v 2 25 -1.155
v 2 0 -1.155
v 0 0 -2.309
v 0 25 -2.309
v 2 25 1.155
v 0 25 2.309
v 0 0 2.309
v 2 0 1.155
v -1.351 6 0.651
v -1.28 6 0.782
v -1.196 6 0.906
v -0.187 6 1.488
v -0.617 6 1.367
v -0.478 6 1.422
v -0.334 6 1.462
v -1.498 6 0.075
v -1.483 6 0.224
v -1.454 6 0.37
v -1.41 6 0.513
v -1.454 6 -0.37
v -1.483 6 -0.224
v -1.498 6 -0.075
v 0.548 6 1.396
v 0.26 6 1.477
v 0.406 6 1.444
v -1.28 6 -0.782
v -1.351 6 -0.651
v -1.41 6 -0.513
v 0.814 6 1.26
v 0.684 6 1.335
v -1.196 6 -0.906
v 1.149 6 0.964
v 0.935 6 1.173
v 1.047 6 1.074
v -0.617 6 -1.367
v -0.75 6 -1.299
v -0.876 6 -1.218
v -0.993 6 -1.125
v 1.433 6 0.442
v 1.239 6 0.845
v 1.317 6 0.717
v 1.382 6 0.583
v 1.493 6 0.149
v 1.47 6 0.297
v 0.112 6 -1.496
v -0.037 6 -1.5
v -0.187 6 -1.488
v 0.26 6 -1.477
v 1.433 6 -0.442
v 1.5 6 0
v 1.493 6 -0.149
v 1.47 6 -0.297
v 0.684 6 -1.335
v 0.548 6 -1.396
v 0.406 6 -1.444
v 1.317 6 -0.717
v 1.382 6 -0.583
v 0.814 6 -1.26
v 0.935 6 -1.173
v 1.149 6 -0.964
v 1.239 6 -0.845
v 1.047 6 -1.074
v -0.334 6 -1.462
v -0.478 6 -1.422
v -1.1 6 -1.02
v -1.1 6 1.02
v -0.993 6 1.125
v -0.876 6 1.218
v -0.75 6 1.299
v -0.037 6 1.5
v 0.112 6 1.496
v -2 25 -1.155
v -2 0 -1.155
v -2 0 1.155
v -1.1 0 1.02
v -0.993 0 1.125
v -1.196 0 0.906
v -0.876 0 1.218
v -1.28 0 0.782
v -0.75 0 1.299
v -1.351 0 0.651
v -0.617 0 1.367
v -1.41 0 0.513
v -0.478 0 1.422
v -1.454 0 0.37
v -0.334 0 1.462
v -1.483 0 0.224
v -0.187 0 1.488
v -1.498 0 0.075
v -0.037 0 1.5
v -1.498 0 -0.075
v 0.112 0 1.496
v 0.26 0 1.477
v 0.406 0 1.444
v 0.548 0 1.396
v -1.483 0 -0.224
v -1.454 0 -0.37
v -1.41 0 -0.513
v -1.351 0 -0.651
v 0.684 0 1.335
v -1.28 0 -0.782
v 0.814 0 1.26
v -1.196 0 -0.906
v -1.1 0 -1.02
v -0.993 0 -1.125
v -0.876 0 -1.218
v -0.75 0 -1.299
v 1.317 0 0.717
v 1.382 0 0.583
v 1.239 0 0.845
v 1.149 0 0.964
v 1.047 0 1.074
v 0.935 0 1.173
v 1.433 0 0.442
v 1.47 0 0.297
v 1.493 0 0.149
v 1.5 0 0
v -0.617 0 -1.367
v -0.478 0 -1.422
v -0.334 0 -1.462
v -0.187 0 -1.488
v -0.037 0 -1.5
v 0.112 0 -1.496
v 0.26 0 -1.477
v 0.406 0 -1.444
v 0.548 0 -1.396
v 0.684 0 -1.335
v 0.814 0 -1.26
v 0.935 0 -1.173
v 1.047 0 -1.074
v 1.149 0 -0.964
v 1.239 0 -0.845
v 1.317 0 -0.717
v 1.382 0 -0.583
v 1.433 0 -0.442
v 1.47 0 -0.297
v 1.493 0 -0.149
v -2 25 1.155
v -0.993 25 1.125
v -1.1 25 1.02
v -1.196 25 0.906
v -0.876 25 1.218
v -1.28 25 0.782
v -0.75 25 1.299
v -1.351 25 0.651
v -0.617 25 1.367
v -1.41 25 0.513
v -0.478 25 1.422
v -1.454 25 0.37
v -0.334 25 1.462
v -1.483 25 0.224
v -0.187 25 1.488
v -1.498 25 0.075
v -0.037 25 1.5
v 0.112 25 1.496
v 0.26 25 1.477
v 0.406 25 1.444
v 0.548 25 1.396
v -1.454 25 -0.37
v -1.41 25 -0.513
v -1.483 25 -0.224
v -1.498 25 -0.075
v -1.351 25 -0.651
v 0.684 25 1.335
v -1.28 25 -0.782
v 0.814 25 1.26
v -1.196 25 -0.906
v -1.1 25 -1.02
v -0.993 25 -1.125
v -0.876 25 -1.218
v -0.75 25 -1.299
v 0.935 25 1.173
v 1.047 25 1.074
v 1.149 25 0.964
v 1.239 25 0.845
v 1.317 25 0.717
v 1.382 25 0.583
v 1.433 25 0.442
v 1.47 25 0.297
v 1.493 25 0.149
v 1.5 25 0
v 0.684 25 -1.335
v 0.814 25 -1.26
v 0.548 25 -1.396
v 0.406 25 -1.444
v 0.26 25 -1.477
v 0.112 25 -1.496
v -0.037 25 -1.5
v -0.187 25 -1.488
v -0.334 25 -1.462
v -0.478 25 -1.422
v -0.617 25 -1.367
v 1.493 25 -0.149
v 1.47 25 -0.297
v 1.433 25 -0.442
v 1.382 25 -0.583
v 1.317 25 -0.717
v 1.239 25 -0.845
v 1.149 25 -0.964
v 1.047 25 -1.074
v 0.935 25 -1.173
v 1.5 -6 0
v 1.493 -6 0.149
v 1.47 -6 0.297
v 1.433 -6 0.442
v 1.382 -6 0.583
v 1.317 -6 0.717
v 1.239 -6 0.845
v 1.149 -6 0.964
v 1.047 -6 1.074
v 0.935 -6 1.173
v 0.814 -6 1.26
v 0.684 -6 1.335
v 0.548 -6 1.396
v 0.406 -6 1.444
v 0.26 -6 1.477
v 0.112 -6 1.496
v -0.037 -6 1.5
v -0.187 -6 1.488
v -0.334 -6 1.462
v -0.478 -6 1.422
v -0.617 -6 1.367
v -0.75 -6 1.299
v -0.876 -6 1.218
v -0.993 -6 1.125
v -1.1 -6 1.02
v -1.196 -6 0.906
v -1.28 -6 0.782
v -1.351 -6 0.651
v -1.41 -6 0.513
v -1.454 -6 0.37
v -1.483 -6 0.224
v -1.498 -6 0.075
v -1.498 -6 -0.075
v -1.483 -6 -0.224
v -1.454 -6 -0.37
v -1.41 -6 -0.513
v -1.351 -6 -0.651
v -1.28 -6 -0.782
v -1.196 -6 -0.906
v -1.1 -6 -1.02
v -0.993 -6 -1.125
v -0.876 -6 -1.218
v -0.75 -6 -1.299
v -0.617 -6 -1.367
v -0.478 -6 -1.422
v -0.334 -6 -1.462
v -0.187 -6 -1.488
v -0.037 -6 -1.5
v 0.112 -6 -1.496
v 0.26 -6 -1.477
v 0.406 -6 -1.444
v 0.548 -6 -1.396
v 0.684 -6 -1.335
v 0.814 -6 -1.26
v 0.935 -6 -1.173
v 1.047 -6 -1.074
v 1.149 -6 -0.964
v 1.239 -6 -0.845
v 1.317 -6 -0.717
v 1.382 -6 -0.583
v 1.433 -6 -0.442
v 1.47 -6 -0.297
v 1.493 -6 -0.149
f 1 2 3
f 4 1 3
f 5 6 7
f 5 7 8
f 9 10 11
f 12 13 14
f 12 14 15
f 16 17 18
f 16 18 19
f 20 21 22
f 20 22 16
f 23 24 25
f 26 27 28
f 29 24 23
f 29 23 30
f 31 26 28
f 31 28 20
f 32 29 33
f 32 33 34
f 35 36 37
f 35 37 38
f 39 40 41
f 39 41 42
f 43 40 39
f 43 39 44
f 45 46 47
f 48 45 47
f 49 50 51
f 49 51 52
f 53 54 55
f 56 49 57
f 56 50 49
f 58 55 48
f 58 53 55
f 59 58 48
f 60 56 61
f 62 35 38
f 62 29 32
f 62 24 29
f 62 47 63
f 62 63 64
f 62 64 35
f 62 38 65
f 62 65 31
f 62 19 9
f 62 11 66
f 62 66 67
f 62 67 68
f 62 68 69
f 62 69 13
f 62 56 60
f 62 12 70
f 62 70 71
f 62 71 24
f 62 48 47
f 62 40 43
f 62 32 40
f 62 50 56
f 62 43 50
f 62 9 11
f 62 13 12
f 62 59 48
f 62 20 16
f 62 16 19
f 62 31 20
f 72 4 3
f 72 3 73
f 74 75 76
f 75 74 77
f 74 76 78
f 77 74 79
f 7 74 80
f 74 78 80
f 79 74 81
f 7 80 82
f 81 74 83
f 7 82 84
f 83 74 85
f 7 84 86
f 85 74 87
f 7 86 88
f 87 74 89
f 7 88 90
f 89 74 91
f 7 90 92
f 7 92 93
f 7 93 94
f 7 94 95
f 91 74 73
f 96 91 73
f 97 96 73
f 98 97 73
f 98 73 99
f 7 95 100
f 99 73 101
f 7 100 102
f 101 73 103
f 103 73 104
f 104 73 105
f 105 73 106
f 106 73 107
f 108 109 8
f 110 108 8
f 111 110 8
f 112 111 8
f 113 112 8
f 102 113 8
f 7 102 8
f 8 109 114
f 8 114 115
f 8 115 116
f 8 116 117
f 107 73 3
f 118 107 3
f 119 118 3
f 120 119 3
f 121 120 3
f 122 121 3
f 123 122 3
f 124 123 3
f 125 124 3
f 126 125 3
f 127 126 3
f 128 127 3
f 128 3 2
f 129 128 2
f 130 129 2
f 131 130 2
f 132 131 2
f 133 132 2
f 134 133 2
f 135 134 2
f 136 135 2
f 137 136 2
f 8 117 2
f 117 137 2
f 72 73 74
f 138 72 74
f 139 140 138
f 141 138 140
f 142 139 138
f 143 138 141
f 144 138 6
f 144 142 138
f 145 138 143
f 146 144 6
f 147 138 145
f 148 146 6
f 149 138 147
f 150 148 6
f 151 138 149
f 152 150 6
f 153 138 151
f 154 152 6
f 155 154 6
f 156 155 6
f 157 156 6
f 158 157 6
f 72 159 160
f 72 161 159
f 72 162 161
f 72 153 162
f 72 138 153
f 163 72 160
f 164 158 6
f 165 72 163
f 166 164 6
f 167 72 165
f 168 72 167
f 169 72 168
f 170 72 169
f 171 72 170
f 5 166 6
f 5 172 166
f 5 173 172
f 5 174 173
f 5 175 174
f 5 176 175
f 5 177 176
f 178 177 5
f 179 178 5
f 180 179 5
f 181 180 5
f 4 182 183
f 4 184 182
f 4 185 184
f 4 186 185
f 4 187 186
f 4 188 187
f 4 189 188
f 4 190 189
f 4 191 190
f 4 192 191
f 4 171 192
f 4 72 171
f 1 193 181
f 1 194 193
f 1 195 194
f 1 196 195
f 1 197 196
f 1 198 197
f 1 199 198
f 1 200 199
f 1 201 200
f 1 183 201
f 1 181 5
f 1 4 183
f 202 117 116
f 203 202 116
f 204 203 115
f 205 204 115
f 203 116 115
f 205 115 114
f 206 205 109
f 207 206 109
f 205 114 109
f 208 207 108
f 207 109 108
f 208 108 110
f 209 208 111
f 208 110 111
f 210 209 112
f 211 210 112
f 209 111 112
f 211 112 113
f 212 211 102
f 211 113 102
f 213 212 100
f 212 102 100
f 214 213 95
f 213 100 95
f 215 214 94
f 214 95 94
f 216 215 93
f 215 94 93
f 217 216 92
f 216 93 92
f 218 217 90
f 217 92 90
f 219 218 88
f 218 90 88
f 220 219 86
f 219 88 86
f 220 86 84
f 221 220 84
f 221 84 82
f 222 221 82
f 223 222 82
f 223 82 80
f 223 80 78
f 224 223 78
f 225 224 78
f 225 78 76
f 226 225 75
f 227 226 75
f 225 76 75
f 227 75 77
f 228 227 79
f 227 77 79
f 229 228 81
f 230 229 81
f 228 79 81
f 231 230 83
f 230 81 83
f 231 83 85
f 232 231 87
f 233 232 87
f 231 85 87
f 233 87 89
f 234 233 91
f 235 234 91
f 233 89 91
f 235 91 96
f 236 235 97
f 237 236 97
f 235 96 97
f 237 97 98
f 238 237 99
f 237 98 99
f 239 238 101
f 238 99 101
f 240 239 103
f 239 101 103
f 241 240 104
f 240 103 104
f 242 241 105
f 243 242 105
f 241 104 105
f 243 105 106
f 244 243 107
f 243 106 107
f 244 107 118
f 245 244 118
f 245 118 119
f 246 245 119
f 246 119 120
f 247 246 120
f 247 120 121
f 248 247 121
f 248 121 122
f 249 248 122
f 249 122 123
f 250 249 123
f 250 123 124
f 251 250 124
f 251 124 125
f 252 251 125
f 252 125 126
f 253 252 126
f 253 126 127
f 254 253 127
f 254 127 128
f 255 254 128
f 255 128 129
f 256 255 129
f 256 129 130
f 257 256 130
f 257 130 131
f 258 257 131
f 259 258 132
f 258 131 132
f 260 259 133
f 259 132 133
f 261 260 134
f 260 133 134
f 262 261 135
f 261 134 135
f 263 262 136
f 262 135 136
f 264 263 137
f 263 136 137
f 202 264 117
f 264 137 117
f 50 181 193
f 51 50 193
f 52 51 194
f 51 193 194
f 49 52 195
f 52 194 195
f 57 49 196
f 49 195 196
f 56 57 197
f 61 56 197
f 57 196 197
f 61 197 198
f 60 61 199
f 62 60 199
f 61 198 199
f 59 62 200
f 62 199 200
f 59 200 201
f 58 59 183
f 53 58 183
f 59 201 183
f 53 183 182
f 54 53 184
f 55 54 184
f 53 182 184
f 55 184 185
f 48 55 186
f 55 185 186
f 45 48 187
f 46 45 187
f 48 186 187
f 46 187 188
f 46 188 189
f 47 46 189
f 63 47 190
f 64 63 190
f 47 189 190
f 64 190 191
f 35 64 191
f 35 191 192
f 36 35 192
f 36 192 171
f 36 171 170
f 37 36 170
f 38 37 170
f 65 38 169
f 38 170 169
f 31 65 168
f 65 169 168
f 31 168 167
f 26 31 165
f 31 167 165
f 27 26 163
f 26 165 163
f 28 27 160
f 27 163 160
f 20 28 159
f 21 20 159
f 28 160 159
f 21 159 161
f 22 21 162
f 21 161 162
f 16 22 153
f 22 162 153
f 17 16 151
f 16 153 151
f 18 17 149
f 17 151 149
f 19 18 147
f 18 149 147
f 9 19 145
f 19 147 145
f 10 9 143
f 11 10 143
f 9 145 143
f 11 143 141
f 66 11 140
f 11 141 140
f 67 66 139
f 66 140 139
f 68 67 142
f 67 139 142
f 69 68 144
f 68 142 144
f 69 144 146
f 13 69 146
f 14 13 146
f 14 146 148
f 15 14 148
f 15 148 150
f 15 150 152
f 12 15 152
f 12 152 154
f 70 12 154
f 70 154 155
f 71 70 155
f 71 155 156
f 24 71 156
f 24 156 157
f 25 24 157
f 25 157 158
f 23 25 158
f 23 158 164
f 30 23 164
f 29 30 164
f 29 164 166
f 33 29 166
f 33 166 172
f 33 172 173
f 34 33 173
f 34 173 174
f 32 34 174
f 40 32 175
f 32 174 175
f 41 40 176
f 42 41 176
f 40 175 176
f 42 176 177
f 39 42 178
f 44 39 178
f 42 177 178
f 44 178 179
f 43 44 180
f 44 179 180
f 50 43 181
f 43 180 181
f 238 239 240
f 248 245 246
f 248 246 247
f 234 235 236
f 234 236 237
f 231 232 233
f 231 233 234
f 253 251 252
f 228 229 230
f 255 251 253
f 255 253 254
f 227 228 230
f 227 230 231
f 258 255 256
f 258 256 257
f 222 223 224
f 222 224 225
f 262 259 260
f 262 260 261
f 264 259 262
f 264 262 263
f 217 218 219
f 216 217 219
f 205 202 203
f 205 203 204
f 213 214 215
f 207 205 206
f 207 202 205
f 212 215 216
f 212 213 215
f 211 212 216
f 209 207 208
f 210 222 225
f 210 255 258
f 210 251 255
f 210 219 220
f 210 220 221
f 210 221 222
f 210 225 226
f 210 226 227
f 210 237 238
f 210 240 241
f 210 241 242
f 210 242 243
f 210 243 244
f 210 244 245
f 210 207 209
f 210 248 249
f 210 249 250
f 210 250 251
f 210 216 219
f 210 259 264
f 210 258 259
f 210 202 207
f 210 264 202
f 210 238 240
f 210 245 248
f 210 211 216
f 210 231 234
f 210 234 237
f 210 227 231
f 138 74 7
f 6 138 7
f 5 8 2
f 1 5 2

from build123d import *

# Parameters (mm, degrees)
BOSS_EXTRUDE1_DEPTH = 25
SKETCH2_R           = 1.5
CUT_EXTRUDE1_DEPTH  = 19
SKETCH3_R           = 1.5
BOSS_EXTRUDE2_DEPTH = 6


with BuildPart() as part:
    # Sketch1 → Boss-Extrude1 (new body)
    with BuildSketch(Plane(origin=(0, 0, 0), x_dir=(1, 0, 0), z_dir=(0, 1, 0))):
        Polygon((0, -2.309401077), (2, -1.154700538), (2, 1.154700538), (0, 2.309401077), (-2, 1.154700538), (-2, -1.154700538), align=None)
    extrude(amount=BOSS_EXTRUDE1_DEPTH)

    # Sketch2 → Cut-Extrude1 (cut)
    with BuildSketch(Plane(origin=(0, 25, 0), x_dir=(1, 0, 0), z_dir=(0, 1, 0))):
        Circle(SKETCH2_R)
    extrude(amount=-CUT_EXTRUDE1_DEPTH, mode=Mode.SUBTRACT)

    # Sketch3 → Boss-Extrude2 (add)
    with BuildSketch(Plane.XZ):
        Circle(SKETCH3_R)
    extrude(amount=BOSS_EXTRUDE2_DEPTH)


solid = part.part
